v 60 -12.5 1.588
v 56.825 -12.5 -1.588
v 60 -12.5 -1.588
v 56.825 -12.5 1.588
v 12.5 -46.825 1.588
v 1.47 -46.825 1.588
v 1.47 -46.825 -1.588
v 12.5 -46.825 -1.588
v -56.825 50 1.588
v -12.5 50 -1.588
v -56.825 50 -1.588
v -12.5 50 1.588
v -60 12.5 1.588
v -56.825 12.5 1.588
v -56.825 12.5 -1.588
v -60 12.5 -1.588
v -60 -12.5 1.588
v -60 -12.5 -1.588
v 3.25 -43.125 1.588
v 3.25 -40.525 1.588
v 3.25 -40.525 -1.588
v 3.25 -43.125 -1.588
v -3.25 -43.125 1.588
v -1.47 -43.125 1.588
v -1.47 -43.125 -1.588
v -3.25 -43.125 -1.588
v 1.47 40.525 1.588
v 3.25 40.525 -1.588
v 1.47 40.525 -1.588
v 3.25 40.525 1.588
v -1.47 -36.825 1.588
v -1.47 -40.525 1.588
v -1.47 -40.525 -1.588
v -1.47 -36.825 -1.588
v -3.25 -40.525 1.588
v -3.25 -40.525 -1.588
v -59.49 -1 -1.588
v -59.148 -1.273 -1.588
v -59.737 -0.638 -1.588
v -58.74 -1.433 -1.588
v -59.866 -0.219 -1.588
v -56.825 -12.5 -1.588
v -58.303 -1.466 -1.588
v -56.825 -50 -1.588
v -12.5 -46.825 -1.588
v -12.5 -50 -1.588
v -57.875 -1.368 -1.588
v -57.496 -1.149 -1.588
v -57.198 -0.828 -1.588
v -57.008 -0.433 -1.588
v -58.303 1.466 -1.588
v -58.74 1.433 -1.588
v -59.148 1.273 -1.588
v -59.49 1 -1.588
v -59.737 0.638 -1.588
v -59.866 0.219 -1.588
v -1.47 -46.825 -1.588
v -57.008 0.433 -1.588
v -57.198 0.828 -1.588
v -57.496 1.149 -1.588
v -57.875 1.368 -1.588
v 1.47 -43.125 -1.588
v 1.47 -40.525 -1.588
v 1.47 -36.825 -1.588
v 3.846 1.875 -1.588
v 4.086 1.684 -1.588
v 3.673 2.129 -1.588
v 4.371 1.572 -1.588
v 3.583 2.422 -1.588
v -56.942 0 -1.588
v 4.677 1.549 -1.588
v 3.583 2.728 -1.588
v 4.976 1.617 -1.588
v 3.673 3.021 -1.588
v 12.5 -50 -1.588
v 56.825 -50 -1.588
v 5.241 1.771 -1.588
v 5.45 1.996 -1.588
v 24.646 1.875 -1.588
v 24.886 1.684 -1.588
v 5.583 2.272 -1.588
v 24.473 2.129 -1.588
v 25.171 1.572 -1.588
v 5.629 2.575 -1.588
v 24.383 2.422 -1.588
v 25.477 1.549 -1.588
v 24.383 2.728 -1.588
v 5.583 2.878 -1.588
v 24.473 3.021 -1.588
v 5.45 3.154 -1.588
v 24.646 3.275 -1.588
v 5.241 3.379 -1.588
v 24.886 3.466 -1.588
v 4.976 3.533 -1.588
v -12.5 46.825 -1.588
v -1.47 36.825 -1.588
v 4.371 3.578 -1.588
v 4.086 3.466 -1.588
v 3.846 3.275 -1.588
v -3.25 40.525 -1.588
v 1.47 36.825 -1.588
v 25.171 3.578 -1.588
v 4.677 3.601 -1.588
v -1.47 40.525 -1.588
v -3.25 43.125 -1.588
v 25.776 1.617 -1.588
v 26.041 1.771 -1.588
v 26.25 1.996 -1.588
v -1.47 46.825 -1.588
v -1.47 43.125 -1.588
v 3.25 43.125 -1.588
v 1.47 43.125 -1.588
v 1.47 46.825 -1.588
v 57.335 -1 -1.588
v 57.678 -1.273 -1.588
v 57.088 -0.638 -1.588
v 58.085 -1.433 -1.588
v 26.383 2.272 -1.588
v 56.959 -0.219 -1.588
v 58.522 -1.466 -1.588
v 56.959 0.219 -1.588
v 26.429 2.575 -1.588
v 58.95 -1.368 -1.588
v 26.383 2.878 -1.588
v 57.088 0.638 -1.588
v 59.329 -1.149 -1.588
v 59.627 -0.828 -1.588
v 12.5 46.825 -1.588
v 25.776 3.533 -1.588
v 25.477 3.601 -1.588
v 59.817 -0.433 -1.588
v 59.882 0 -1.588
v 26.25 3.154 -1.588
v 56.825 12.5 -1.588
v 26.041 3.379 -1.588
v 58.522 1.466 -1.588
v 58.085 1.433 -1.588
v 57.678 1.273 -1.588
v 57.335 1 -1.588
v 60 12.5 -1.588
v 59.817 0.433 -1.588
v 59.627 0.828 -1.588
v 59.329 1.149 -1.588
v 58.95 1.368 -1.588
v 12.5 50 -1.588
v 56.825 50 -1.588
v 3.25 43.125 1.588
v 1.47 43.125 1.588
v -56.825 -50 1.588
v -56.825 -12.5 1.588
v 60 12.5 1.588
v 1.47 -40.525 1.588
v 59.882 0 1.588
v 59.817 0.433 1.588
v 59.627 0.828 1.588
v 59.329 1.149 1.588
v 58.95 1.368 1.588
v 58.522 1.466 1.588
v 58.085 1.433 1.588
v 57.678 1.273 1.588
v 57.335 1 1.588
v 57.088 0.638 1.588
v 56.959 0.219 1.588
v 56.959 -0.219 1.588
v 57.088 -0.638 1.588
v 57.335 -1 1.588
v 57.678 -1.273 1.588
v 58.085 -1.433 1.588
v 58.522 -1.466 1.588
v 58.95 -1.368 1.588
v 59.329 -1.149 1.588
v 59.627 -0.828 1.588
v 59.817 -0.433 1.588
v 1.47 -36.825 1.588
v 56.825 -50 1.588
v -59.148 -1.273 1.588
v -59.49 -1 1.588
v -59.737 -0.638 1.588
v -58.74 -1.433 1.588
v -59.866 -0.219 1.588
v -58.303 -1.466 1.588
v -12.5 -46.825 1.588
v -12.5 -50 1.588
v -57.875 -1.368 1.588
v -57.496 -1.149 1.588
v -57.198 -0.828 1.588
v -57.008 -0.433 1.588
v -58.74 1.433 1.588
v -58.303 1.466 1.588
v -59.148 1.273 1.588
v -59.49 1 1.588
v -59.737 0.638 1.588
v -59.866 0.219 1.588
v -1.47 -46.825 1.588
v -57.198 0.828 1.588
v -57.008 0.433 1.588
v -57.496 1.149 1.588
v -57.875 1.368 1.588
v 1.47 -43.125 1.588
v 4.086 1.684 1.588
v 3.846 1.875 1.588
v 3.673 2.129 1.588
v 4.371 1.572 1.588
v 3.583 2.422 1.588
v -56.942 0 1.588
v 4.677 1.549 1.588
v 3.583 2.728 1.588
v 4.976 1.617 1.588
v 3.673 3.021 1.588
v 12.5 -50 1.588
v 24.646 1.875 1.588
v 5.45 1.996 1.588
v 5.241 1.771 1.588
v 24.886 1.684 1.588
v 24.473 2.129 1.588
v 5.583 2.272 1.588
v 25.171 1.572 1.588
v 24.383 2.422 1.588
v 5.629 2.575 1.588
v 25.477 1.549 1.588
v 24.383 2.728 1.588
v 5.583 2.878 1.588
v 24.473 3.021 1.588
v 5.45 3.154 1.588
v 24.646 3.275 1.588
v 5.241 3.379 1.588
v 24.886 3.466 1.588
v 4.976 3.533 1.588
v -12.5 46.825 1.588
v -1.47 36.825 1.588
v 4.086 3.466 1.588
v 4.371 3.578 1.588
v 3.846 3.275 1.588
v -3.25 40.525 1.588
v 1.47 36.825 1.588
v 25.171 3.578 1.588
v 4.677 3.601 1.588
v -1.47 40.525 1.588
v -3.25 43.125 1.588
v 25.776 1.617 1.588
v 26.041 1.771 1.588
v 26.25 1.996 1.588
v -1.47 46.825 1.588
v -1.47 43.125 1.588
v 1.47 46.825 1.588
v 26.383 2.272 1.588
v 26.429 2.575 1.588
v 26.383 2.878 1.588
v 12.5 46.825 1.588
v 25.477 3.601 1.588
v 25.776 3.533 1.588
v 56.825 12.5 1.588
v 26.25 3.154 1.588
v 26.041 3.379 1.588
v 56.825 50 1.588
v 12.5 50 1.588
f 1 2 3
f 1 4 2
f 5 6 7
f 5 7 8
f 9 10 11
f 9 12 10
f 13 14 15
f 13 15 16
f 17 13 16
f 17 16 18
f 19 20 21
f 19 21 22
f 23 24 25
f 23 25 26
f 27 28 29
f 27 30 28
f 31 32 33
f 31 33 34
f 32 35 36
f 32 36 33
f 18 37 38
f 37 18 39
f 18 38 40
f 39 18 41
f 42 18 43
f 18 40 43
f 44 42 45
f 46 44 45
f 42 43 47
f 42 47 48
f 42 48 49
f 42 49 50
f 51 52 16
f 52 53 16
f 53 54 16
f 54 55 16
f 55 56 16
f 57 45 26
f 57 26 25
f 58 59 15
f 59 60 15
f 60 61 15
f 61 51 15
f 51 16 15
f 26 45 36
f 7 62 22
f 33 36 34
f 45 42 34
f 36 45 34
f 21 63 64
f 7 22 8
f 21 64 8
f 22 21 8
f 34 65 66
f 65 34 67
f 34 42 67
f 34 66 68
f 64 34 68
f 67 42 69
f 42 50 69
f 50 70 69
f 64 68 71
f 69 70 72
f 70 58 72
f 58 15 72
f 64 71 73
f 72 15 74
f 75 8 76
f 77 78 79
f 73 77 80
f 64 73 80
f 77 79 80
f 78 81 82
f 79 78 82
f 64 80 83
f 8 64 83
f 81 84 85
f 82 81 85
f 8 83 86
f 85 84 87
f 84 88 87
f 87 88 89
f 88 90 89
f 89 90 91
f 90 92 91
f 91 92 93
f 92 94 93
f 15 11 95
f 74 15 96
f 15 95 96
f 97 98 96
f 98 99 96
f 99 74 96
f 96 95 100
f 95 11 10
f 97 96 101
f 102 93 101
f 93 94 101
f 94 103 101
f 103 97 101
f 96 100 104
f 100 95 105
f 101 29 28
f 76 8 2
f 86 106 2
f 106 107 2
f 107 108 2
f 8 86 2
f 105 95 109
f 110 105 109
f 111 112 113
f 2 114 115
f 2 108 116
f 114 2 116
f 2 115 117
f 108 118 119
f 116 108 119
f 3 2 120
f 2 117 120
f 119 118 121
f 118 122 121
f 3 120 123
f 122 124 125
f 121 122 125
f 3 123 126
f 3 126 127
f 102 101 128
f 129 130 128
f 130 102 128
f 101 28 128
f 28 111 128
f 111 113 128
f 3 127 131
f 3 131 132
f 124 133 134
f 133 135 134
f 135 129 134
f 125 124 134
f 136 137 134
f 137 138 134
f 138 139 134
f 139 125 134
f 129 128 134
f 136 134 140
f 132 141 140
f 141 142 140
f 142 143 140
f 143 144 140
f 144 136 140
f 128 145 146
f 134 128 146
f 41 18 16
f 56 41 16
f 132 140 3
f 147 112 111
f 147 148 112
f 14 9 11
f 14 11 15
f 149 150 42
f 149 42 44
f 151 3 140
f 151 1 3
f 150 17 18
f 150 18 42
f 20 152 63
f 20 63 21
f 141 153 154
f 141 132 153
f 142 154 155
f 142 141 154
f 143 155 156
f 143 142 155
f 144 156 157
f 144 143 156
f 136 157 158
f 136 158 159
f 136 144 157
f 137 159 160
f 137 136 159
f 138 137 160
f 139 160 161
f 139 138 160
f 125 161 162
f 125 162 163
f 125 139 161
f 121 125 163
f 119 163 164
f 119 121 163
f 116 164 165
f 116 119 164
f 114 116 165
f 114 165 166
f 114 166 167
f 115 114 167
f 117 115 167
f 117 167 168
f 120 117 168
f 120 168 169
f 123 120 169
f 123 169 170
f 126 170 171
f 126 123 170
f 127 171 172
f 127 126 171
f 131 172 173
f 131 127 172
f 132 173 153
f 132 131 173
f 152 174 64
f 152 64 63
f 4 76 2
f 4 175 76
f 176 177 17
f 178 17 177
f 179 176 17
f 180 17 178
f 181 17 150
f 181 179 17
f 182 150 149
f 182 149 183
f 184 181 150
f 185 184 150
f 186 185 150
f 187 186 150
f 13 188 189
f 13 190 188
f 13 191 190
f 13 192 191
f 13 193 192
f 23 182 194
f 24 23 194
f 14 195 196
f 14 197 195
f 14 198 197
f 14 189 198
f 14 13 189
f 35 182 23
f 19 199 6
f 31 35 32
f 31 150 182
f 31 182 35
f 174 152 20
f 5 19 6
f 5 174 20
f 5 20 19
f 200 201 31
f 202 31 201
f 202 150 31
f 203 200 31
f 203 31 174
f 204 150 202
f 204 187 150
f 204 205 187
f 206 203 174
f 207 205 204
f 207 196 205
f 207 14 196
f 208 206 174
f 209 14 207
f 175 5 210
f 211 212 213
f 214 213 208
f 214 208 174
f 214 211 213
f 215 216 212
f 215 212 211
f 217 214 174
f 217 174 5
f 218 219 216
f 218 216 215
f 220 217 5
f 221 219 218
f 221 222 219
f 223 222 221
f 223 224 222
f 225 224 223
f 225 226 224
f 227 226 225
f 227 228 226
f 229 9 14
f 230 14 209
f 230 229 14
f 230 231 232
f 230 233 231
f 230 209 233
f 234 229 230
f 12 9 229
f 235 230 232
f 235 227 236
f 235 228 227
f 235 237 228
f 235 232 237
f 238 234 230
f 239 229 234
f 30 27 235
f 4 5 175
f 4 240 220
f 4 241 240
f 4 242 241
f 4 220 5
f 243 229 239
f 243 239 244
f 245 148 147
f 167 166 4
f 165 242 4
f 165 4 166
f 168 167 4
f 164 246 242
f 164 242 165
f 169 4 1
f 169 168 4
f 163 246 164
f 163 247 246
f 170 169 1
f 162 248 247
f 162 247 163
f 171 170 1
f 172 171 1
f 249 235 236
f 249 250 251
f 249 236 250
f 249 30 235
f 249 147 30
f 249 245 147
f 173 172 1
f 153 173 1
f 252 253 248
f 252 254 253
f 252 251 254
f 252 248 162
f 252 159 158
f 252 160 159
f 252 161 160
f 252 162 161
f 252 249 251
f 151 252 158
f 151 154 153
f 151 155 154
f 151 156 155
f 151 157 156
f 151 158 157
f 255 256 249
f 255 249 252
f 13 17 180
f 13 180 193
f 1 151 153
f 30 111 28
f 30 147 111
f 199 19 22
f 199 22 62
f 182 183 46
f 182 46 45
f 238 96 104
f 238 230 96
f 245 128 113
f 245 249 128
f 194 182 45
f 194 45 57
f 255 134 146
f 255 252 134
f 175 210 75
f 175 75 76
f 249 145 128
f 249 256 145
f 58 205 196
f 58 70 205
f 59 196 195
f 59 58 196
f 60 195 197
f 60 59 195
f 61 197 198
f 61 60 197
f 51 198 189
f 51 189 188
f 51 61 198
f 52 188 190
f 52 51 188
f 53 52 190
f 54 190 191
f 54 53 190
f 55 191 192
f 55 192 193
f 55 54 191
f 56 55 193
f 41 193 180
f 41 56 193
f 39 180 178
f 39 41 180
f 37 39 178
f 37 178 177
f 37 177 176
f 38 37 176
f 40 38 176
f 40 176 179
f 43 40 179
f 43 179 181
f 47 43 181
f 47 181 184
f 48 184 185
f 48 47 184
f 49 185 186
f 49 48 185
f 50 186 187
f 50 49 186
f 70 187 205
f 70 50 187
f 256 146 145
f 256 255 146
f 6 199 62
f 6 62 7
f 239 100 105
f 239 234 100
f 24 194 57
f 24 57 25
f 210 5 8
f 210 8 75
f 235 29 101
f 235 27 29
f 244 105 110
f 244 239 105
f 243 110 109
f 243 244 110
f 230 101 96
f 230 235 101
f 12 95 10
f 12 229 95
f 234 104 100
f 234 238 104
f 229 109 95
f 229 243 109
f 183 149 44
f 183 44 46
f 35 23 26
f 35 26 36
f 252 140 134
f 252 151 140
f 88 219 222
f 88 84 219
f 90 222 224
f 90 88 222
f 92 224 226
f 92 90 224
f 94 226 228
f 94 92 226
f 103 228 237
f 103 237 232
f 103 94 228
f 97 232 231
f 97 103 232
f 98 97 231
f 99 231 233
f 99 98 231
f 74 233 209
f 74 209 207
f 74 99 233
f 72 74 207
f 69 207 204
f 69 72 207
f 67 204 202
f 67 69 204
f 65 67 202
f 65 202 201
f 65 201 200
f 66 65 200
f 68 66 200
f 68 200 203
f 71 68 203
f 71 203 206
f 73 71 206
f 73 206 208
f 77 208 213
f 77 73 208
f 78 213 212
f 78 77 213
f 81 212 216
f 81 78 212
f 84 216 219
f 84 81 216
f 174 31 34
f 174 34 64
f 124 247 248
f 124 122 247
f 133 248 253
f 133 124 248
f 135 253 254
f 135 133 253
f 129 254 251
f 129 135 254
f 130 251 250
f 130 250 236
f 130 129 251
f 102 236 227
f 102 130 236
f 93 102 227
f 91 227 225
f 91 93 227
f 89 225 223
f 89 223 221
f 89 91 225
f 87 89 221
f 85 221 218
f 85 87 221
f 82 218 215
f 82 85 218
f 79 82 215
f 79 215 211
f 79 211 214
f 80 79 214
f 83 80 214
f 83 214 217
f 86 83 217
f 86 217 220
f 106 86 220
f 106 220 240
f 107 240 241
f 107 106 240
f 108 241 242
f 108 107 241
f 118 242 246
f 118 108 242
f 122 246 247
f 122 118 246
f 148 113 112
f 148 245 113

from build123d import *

# Parameters (mm, degrees)
SKETCH1_R           = 1.0287
SKETCH1_R_2         = 1.47
BOSS_EXTRUDE1_DEPTH = 1.5875


with BuildPart() as part:
    # Sketch1 → Boss-Extrude1 (new body, symmetric)
    with BuildSketch(Plane.XY):
        Polygon((-12.5, 50), (-56.825, 50), (-56.825, 12.5), (-60, 12.5), (-60, -12.5), (-56.825, -12.5), (-56.825, -50), (-12.5, -50), (-12.5, -46.825), (-1.47, -46.825), (-1.47, -43.125), (-3.25, -43.125), (-3.25, -40.525), (-1.47, -40.525), (-1.47, -36.825), (1.47, -36.825), (1.47, -40.525), (3.25, -40.525), (3.25, -43.125), (1.47, -43.125), (1.47, -46.825), (12.5, -46.825), (12.5, -50), (56.825, -50), (56.825, -12.5), (60, -12.5), (60, 12.5), (56.825, 12.5), (56.825, 50), (12.5, 50), (12.5, 46.825), (1.47, 46.825), (1.47, 43.125), (3.25, 43.125), (3.25, 40.525), (1.47, 40.525), (1.47, 36.825), (-1.47, 36.825), (-1.47, 40.525), (-3.25, 40.525), (-3.25, 43.125), (-1.47, 43.125), (-1.47, 46.825), (-12.5, 46.825), align=None)
        with Locations((4.6, 2.575)):
            Circle(SKETCH1_R, mode=Mode.SUBTRACT)
        with Locations((25.4, 2.575)):
            Circle(SKETCH1_R, mode=Mode.SUBTRACT)
        with Locations((-58.4125, 0)):
            Circle(SKETCH1_R_2, mode=Mode.SUBTRACT)
        with Locations((58.4125, 0)):
            Circle(SKETCH1_R_2, mode=Mode.SUBTRACT)
    extrude(amount=BOSS_EXTRUDE1_DEPTH, both=True)


solid = part.part
